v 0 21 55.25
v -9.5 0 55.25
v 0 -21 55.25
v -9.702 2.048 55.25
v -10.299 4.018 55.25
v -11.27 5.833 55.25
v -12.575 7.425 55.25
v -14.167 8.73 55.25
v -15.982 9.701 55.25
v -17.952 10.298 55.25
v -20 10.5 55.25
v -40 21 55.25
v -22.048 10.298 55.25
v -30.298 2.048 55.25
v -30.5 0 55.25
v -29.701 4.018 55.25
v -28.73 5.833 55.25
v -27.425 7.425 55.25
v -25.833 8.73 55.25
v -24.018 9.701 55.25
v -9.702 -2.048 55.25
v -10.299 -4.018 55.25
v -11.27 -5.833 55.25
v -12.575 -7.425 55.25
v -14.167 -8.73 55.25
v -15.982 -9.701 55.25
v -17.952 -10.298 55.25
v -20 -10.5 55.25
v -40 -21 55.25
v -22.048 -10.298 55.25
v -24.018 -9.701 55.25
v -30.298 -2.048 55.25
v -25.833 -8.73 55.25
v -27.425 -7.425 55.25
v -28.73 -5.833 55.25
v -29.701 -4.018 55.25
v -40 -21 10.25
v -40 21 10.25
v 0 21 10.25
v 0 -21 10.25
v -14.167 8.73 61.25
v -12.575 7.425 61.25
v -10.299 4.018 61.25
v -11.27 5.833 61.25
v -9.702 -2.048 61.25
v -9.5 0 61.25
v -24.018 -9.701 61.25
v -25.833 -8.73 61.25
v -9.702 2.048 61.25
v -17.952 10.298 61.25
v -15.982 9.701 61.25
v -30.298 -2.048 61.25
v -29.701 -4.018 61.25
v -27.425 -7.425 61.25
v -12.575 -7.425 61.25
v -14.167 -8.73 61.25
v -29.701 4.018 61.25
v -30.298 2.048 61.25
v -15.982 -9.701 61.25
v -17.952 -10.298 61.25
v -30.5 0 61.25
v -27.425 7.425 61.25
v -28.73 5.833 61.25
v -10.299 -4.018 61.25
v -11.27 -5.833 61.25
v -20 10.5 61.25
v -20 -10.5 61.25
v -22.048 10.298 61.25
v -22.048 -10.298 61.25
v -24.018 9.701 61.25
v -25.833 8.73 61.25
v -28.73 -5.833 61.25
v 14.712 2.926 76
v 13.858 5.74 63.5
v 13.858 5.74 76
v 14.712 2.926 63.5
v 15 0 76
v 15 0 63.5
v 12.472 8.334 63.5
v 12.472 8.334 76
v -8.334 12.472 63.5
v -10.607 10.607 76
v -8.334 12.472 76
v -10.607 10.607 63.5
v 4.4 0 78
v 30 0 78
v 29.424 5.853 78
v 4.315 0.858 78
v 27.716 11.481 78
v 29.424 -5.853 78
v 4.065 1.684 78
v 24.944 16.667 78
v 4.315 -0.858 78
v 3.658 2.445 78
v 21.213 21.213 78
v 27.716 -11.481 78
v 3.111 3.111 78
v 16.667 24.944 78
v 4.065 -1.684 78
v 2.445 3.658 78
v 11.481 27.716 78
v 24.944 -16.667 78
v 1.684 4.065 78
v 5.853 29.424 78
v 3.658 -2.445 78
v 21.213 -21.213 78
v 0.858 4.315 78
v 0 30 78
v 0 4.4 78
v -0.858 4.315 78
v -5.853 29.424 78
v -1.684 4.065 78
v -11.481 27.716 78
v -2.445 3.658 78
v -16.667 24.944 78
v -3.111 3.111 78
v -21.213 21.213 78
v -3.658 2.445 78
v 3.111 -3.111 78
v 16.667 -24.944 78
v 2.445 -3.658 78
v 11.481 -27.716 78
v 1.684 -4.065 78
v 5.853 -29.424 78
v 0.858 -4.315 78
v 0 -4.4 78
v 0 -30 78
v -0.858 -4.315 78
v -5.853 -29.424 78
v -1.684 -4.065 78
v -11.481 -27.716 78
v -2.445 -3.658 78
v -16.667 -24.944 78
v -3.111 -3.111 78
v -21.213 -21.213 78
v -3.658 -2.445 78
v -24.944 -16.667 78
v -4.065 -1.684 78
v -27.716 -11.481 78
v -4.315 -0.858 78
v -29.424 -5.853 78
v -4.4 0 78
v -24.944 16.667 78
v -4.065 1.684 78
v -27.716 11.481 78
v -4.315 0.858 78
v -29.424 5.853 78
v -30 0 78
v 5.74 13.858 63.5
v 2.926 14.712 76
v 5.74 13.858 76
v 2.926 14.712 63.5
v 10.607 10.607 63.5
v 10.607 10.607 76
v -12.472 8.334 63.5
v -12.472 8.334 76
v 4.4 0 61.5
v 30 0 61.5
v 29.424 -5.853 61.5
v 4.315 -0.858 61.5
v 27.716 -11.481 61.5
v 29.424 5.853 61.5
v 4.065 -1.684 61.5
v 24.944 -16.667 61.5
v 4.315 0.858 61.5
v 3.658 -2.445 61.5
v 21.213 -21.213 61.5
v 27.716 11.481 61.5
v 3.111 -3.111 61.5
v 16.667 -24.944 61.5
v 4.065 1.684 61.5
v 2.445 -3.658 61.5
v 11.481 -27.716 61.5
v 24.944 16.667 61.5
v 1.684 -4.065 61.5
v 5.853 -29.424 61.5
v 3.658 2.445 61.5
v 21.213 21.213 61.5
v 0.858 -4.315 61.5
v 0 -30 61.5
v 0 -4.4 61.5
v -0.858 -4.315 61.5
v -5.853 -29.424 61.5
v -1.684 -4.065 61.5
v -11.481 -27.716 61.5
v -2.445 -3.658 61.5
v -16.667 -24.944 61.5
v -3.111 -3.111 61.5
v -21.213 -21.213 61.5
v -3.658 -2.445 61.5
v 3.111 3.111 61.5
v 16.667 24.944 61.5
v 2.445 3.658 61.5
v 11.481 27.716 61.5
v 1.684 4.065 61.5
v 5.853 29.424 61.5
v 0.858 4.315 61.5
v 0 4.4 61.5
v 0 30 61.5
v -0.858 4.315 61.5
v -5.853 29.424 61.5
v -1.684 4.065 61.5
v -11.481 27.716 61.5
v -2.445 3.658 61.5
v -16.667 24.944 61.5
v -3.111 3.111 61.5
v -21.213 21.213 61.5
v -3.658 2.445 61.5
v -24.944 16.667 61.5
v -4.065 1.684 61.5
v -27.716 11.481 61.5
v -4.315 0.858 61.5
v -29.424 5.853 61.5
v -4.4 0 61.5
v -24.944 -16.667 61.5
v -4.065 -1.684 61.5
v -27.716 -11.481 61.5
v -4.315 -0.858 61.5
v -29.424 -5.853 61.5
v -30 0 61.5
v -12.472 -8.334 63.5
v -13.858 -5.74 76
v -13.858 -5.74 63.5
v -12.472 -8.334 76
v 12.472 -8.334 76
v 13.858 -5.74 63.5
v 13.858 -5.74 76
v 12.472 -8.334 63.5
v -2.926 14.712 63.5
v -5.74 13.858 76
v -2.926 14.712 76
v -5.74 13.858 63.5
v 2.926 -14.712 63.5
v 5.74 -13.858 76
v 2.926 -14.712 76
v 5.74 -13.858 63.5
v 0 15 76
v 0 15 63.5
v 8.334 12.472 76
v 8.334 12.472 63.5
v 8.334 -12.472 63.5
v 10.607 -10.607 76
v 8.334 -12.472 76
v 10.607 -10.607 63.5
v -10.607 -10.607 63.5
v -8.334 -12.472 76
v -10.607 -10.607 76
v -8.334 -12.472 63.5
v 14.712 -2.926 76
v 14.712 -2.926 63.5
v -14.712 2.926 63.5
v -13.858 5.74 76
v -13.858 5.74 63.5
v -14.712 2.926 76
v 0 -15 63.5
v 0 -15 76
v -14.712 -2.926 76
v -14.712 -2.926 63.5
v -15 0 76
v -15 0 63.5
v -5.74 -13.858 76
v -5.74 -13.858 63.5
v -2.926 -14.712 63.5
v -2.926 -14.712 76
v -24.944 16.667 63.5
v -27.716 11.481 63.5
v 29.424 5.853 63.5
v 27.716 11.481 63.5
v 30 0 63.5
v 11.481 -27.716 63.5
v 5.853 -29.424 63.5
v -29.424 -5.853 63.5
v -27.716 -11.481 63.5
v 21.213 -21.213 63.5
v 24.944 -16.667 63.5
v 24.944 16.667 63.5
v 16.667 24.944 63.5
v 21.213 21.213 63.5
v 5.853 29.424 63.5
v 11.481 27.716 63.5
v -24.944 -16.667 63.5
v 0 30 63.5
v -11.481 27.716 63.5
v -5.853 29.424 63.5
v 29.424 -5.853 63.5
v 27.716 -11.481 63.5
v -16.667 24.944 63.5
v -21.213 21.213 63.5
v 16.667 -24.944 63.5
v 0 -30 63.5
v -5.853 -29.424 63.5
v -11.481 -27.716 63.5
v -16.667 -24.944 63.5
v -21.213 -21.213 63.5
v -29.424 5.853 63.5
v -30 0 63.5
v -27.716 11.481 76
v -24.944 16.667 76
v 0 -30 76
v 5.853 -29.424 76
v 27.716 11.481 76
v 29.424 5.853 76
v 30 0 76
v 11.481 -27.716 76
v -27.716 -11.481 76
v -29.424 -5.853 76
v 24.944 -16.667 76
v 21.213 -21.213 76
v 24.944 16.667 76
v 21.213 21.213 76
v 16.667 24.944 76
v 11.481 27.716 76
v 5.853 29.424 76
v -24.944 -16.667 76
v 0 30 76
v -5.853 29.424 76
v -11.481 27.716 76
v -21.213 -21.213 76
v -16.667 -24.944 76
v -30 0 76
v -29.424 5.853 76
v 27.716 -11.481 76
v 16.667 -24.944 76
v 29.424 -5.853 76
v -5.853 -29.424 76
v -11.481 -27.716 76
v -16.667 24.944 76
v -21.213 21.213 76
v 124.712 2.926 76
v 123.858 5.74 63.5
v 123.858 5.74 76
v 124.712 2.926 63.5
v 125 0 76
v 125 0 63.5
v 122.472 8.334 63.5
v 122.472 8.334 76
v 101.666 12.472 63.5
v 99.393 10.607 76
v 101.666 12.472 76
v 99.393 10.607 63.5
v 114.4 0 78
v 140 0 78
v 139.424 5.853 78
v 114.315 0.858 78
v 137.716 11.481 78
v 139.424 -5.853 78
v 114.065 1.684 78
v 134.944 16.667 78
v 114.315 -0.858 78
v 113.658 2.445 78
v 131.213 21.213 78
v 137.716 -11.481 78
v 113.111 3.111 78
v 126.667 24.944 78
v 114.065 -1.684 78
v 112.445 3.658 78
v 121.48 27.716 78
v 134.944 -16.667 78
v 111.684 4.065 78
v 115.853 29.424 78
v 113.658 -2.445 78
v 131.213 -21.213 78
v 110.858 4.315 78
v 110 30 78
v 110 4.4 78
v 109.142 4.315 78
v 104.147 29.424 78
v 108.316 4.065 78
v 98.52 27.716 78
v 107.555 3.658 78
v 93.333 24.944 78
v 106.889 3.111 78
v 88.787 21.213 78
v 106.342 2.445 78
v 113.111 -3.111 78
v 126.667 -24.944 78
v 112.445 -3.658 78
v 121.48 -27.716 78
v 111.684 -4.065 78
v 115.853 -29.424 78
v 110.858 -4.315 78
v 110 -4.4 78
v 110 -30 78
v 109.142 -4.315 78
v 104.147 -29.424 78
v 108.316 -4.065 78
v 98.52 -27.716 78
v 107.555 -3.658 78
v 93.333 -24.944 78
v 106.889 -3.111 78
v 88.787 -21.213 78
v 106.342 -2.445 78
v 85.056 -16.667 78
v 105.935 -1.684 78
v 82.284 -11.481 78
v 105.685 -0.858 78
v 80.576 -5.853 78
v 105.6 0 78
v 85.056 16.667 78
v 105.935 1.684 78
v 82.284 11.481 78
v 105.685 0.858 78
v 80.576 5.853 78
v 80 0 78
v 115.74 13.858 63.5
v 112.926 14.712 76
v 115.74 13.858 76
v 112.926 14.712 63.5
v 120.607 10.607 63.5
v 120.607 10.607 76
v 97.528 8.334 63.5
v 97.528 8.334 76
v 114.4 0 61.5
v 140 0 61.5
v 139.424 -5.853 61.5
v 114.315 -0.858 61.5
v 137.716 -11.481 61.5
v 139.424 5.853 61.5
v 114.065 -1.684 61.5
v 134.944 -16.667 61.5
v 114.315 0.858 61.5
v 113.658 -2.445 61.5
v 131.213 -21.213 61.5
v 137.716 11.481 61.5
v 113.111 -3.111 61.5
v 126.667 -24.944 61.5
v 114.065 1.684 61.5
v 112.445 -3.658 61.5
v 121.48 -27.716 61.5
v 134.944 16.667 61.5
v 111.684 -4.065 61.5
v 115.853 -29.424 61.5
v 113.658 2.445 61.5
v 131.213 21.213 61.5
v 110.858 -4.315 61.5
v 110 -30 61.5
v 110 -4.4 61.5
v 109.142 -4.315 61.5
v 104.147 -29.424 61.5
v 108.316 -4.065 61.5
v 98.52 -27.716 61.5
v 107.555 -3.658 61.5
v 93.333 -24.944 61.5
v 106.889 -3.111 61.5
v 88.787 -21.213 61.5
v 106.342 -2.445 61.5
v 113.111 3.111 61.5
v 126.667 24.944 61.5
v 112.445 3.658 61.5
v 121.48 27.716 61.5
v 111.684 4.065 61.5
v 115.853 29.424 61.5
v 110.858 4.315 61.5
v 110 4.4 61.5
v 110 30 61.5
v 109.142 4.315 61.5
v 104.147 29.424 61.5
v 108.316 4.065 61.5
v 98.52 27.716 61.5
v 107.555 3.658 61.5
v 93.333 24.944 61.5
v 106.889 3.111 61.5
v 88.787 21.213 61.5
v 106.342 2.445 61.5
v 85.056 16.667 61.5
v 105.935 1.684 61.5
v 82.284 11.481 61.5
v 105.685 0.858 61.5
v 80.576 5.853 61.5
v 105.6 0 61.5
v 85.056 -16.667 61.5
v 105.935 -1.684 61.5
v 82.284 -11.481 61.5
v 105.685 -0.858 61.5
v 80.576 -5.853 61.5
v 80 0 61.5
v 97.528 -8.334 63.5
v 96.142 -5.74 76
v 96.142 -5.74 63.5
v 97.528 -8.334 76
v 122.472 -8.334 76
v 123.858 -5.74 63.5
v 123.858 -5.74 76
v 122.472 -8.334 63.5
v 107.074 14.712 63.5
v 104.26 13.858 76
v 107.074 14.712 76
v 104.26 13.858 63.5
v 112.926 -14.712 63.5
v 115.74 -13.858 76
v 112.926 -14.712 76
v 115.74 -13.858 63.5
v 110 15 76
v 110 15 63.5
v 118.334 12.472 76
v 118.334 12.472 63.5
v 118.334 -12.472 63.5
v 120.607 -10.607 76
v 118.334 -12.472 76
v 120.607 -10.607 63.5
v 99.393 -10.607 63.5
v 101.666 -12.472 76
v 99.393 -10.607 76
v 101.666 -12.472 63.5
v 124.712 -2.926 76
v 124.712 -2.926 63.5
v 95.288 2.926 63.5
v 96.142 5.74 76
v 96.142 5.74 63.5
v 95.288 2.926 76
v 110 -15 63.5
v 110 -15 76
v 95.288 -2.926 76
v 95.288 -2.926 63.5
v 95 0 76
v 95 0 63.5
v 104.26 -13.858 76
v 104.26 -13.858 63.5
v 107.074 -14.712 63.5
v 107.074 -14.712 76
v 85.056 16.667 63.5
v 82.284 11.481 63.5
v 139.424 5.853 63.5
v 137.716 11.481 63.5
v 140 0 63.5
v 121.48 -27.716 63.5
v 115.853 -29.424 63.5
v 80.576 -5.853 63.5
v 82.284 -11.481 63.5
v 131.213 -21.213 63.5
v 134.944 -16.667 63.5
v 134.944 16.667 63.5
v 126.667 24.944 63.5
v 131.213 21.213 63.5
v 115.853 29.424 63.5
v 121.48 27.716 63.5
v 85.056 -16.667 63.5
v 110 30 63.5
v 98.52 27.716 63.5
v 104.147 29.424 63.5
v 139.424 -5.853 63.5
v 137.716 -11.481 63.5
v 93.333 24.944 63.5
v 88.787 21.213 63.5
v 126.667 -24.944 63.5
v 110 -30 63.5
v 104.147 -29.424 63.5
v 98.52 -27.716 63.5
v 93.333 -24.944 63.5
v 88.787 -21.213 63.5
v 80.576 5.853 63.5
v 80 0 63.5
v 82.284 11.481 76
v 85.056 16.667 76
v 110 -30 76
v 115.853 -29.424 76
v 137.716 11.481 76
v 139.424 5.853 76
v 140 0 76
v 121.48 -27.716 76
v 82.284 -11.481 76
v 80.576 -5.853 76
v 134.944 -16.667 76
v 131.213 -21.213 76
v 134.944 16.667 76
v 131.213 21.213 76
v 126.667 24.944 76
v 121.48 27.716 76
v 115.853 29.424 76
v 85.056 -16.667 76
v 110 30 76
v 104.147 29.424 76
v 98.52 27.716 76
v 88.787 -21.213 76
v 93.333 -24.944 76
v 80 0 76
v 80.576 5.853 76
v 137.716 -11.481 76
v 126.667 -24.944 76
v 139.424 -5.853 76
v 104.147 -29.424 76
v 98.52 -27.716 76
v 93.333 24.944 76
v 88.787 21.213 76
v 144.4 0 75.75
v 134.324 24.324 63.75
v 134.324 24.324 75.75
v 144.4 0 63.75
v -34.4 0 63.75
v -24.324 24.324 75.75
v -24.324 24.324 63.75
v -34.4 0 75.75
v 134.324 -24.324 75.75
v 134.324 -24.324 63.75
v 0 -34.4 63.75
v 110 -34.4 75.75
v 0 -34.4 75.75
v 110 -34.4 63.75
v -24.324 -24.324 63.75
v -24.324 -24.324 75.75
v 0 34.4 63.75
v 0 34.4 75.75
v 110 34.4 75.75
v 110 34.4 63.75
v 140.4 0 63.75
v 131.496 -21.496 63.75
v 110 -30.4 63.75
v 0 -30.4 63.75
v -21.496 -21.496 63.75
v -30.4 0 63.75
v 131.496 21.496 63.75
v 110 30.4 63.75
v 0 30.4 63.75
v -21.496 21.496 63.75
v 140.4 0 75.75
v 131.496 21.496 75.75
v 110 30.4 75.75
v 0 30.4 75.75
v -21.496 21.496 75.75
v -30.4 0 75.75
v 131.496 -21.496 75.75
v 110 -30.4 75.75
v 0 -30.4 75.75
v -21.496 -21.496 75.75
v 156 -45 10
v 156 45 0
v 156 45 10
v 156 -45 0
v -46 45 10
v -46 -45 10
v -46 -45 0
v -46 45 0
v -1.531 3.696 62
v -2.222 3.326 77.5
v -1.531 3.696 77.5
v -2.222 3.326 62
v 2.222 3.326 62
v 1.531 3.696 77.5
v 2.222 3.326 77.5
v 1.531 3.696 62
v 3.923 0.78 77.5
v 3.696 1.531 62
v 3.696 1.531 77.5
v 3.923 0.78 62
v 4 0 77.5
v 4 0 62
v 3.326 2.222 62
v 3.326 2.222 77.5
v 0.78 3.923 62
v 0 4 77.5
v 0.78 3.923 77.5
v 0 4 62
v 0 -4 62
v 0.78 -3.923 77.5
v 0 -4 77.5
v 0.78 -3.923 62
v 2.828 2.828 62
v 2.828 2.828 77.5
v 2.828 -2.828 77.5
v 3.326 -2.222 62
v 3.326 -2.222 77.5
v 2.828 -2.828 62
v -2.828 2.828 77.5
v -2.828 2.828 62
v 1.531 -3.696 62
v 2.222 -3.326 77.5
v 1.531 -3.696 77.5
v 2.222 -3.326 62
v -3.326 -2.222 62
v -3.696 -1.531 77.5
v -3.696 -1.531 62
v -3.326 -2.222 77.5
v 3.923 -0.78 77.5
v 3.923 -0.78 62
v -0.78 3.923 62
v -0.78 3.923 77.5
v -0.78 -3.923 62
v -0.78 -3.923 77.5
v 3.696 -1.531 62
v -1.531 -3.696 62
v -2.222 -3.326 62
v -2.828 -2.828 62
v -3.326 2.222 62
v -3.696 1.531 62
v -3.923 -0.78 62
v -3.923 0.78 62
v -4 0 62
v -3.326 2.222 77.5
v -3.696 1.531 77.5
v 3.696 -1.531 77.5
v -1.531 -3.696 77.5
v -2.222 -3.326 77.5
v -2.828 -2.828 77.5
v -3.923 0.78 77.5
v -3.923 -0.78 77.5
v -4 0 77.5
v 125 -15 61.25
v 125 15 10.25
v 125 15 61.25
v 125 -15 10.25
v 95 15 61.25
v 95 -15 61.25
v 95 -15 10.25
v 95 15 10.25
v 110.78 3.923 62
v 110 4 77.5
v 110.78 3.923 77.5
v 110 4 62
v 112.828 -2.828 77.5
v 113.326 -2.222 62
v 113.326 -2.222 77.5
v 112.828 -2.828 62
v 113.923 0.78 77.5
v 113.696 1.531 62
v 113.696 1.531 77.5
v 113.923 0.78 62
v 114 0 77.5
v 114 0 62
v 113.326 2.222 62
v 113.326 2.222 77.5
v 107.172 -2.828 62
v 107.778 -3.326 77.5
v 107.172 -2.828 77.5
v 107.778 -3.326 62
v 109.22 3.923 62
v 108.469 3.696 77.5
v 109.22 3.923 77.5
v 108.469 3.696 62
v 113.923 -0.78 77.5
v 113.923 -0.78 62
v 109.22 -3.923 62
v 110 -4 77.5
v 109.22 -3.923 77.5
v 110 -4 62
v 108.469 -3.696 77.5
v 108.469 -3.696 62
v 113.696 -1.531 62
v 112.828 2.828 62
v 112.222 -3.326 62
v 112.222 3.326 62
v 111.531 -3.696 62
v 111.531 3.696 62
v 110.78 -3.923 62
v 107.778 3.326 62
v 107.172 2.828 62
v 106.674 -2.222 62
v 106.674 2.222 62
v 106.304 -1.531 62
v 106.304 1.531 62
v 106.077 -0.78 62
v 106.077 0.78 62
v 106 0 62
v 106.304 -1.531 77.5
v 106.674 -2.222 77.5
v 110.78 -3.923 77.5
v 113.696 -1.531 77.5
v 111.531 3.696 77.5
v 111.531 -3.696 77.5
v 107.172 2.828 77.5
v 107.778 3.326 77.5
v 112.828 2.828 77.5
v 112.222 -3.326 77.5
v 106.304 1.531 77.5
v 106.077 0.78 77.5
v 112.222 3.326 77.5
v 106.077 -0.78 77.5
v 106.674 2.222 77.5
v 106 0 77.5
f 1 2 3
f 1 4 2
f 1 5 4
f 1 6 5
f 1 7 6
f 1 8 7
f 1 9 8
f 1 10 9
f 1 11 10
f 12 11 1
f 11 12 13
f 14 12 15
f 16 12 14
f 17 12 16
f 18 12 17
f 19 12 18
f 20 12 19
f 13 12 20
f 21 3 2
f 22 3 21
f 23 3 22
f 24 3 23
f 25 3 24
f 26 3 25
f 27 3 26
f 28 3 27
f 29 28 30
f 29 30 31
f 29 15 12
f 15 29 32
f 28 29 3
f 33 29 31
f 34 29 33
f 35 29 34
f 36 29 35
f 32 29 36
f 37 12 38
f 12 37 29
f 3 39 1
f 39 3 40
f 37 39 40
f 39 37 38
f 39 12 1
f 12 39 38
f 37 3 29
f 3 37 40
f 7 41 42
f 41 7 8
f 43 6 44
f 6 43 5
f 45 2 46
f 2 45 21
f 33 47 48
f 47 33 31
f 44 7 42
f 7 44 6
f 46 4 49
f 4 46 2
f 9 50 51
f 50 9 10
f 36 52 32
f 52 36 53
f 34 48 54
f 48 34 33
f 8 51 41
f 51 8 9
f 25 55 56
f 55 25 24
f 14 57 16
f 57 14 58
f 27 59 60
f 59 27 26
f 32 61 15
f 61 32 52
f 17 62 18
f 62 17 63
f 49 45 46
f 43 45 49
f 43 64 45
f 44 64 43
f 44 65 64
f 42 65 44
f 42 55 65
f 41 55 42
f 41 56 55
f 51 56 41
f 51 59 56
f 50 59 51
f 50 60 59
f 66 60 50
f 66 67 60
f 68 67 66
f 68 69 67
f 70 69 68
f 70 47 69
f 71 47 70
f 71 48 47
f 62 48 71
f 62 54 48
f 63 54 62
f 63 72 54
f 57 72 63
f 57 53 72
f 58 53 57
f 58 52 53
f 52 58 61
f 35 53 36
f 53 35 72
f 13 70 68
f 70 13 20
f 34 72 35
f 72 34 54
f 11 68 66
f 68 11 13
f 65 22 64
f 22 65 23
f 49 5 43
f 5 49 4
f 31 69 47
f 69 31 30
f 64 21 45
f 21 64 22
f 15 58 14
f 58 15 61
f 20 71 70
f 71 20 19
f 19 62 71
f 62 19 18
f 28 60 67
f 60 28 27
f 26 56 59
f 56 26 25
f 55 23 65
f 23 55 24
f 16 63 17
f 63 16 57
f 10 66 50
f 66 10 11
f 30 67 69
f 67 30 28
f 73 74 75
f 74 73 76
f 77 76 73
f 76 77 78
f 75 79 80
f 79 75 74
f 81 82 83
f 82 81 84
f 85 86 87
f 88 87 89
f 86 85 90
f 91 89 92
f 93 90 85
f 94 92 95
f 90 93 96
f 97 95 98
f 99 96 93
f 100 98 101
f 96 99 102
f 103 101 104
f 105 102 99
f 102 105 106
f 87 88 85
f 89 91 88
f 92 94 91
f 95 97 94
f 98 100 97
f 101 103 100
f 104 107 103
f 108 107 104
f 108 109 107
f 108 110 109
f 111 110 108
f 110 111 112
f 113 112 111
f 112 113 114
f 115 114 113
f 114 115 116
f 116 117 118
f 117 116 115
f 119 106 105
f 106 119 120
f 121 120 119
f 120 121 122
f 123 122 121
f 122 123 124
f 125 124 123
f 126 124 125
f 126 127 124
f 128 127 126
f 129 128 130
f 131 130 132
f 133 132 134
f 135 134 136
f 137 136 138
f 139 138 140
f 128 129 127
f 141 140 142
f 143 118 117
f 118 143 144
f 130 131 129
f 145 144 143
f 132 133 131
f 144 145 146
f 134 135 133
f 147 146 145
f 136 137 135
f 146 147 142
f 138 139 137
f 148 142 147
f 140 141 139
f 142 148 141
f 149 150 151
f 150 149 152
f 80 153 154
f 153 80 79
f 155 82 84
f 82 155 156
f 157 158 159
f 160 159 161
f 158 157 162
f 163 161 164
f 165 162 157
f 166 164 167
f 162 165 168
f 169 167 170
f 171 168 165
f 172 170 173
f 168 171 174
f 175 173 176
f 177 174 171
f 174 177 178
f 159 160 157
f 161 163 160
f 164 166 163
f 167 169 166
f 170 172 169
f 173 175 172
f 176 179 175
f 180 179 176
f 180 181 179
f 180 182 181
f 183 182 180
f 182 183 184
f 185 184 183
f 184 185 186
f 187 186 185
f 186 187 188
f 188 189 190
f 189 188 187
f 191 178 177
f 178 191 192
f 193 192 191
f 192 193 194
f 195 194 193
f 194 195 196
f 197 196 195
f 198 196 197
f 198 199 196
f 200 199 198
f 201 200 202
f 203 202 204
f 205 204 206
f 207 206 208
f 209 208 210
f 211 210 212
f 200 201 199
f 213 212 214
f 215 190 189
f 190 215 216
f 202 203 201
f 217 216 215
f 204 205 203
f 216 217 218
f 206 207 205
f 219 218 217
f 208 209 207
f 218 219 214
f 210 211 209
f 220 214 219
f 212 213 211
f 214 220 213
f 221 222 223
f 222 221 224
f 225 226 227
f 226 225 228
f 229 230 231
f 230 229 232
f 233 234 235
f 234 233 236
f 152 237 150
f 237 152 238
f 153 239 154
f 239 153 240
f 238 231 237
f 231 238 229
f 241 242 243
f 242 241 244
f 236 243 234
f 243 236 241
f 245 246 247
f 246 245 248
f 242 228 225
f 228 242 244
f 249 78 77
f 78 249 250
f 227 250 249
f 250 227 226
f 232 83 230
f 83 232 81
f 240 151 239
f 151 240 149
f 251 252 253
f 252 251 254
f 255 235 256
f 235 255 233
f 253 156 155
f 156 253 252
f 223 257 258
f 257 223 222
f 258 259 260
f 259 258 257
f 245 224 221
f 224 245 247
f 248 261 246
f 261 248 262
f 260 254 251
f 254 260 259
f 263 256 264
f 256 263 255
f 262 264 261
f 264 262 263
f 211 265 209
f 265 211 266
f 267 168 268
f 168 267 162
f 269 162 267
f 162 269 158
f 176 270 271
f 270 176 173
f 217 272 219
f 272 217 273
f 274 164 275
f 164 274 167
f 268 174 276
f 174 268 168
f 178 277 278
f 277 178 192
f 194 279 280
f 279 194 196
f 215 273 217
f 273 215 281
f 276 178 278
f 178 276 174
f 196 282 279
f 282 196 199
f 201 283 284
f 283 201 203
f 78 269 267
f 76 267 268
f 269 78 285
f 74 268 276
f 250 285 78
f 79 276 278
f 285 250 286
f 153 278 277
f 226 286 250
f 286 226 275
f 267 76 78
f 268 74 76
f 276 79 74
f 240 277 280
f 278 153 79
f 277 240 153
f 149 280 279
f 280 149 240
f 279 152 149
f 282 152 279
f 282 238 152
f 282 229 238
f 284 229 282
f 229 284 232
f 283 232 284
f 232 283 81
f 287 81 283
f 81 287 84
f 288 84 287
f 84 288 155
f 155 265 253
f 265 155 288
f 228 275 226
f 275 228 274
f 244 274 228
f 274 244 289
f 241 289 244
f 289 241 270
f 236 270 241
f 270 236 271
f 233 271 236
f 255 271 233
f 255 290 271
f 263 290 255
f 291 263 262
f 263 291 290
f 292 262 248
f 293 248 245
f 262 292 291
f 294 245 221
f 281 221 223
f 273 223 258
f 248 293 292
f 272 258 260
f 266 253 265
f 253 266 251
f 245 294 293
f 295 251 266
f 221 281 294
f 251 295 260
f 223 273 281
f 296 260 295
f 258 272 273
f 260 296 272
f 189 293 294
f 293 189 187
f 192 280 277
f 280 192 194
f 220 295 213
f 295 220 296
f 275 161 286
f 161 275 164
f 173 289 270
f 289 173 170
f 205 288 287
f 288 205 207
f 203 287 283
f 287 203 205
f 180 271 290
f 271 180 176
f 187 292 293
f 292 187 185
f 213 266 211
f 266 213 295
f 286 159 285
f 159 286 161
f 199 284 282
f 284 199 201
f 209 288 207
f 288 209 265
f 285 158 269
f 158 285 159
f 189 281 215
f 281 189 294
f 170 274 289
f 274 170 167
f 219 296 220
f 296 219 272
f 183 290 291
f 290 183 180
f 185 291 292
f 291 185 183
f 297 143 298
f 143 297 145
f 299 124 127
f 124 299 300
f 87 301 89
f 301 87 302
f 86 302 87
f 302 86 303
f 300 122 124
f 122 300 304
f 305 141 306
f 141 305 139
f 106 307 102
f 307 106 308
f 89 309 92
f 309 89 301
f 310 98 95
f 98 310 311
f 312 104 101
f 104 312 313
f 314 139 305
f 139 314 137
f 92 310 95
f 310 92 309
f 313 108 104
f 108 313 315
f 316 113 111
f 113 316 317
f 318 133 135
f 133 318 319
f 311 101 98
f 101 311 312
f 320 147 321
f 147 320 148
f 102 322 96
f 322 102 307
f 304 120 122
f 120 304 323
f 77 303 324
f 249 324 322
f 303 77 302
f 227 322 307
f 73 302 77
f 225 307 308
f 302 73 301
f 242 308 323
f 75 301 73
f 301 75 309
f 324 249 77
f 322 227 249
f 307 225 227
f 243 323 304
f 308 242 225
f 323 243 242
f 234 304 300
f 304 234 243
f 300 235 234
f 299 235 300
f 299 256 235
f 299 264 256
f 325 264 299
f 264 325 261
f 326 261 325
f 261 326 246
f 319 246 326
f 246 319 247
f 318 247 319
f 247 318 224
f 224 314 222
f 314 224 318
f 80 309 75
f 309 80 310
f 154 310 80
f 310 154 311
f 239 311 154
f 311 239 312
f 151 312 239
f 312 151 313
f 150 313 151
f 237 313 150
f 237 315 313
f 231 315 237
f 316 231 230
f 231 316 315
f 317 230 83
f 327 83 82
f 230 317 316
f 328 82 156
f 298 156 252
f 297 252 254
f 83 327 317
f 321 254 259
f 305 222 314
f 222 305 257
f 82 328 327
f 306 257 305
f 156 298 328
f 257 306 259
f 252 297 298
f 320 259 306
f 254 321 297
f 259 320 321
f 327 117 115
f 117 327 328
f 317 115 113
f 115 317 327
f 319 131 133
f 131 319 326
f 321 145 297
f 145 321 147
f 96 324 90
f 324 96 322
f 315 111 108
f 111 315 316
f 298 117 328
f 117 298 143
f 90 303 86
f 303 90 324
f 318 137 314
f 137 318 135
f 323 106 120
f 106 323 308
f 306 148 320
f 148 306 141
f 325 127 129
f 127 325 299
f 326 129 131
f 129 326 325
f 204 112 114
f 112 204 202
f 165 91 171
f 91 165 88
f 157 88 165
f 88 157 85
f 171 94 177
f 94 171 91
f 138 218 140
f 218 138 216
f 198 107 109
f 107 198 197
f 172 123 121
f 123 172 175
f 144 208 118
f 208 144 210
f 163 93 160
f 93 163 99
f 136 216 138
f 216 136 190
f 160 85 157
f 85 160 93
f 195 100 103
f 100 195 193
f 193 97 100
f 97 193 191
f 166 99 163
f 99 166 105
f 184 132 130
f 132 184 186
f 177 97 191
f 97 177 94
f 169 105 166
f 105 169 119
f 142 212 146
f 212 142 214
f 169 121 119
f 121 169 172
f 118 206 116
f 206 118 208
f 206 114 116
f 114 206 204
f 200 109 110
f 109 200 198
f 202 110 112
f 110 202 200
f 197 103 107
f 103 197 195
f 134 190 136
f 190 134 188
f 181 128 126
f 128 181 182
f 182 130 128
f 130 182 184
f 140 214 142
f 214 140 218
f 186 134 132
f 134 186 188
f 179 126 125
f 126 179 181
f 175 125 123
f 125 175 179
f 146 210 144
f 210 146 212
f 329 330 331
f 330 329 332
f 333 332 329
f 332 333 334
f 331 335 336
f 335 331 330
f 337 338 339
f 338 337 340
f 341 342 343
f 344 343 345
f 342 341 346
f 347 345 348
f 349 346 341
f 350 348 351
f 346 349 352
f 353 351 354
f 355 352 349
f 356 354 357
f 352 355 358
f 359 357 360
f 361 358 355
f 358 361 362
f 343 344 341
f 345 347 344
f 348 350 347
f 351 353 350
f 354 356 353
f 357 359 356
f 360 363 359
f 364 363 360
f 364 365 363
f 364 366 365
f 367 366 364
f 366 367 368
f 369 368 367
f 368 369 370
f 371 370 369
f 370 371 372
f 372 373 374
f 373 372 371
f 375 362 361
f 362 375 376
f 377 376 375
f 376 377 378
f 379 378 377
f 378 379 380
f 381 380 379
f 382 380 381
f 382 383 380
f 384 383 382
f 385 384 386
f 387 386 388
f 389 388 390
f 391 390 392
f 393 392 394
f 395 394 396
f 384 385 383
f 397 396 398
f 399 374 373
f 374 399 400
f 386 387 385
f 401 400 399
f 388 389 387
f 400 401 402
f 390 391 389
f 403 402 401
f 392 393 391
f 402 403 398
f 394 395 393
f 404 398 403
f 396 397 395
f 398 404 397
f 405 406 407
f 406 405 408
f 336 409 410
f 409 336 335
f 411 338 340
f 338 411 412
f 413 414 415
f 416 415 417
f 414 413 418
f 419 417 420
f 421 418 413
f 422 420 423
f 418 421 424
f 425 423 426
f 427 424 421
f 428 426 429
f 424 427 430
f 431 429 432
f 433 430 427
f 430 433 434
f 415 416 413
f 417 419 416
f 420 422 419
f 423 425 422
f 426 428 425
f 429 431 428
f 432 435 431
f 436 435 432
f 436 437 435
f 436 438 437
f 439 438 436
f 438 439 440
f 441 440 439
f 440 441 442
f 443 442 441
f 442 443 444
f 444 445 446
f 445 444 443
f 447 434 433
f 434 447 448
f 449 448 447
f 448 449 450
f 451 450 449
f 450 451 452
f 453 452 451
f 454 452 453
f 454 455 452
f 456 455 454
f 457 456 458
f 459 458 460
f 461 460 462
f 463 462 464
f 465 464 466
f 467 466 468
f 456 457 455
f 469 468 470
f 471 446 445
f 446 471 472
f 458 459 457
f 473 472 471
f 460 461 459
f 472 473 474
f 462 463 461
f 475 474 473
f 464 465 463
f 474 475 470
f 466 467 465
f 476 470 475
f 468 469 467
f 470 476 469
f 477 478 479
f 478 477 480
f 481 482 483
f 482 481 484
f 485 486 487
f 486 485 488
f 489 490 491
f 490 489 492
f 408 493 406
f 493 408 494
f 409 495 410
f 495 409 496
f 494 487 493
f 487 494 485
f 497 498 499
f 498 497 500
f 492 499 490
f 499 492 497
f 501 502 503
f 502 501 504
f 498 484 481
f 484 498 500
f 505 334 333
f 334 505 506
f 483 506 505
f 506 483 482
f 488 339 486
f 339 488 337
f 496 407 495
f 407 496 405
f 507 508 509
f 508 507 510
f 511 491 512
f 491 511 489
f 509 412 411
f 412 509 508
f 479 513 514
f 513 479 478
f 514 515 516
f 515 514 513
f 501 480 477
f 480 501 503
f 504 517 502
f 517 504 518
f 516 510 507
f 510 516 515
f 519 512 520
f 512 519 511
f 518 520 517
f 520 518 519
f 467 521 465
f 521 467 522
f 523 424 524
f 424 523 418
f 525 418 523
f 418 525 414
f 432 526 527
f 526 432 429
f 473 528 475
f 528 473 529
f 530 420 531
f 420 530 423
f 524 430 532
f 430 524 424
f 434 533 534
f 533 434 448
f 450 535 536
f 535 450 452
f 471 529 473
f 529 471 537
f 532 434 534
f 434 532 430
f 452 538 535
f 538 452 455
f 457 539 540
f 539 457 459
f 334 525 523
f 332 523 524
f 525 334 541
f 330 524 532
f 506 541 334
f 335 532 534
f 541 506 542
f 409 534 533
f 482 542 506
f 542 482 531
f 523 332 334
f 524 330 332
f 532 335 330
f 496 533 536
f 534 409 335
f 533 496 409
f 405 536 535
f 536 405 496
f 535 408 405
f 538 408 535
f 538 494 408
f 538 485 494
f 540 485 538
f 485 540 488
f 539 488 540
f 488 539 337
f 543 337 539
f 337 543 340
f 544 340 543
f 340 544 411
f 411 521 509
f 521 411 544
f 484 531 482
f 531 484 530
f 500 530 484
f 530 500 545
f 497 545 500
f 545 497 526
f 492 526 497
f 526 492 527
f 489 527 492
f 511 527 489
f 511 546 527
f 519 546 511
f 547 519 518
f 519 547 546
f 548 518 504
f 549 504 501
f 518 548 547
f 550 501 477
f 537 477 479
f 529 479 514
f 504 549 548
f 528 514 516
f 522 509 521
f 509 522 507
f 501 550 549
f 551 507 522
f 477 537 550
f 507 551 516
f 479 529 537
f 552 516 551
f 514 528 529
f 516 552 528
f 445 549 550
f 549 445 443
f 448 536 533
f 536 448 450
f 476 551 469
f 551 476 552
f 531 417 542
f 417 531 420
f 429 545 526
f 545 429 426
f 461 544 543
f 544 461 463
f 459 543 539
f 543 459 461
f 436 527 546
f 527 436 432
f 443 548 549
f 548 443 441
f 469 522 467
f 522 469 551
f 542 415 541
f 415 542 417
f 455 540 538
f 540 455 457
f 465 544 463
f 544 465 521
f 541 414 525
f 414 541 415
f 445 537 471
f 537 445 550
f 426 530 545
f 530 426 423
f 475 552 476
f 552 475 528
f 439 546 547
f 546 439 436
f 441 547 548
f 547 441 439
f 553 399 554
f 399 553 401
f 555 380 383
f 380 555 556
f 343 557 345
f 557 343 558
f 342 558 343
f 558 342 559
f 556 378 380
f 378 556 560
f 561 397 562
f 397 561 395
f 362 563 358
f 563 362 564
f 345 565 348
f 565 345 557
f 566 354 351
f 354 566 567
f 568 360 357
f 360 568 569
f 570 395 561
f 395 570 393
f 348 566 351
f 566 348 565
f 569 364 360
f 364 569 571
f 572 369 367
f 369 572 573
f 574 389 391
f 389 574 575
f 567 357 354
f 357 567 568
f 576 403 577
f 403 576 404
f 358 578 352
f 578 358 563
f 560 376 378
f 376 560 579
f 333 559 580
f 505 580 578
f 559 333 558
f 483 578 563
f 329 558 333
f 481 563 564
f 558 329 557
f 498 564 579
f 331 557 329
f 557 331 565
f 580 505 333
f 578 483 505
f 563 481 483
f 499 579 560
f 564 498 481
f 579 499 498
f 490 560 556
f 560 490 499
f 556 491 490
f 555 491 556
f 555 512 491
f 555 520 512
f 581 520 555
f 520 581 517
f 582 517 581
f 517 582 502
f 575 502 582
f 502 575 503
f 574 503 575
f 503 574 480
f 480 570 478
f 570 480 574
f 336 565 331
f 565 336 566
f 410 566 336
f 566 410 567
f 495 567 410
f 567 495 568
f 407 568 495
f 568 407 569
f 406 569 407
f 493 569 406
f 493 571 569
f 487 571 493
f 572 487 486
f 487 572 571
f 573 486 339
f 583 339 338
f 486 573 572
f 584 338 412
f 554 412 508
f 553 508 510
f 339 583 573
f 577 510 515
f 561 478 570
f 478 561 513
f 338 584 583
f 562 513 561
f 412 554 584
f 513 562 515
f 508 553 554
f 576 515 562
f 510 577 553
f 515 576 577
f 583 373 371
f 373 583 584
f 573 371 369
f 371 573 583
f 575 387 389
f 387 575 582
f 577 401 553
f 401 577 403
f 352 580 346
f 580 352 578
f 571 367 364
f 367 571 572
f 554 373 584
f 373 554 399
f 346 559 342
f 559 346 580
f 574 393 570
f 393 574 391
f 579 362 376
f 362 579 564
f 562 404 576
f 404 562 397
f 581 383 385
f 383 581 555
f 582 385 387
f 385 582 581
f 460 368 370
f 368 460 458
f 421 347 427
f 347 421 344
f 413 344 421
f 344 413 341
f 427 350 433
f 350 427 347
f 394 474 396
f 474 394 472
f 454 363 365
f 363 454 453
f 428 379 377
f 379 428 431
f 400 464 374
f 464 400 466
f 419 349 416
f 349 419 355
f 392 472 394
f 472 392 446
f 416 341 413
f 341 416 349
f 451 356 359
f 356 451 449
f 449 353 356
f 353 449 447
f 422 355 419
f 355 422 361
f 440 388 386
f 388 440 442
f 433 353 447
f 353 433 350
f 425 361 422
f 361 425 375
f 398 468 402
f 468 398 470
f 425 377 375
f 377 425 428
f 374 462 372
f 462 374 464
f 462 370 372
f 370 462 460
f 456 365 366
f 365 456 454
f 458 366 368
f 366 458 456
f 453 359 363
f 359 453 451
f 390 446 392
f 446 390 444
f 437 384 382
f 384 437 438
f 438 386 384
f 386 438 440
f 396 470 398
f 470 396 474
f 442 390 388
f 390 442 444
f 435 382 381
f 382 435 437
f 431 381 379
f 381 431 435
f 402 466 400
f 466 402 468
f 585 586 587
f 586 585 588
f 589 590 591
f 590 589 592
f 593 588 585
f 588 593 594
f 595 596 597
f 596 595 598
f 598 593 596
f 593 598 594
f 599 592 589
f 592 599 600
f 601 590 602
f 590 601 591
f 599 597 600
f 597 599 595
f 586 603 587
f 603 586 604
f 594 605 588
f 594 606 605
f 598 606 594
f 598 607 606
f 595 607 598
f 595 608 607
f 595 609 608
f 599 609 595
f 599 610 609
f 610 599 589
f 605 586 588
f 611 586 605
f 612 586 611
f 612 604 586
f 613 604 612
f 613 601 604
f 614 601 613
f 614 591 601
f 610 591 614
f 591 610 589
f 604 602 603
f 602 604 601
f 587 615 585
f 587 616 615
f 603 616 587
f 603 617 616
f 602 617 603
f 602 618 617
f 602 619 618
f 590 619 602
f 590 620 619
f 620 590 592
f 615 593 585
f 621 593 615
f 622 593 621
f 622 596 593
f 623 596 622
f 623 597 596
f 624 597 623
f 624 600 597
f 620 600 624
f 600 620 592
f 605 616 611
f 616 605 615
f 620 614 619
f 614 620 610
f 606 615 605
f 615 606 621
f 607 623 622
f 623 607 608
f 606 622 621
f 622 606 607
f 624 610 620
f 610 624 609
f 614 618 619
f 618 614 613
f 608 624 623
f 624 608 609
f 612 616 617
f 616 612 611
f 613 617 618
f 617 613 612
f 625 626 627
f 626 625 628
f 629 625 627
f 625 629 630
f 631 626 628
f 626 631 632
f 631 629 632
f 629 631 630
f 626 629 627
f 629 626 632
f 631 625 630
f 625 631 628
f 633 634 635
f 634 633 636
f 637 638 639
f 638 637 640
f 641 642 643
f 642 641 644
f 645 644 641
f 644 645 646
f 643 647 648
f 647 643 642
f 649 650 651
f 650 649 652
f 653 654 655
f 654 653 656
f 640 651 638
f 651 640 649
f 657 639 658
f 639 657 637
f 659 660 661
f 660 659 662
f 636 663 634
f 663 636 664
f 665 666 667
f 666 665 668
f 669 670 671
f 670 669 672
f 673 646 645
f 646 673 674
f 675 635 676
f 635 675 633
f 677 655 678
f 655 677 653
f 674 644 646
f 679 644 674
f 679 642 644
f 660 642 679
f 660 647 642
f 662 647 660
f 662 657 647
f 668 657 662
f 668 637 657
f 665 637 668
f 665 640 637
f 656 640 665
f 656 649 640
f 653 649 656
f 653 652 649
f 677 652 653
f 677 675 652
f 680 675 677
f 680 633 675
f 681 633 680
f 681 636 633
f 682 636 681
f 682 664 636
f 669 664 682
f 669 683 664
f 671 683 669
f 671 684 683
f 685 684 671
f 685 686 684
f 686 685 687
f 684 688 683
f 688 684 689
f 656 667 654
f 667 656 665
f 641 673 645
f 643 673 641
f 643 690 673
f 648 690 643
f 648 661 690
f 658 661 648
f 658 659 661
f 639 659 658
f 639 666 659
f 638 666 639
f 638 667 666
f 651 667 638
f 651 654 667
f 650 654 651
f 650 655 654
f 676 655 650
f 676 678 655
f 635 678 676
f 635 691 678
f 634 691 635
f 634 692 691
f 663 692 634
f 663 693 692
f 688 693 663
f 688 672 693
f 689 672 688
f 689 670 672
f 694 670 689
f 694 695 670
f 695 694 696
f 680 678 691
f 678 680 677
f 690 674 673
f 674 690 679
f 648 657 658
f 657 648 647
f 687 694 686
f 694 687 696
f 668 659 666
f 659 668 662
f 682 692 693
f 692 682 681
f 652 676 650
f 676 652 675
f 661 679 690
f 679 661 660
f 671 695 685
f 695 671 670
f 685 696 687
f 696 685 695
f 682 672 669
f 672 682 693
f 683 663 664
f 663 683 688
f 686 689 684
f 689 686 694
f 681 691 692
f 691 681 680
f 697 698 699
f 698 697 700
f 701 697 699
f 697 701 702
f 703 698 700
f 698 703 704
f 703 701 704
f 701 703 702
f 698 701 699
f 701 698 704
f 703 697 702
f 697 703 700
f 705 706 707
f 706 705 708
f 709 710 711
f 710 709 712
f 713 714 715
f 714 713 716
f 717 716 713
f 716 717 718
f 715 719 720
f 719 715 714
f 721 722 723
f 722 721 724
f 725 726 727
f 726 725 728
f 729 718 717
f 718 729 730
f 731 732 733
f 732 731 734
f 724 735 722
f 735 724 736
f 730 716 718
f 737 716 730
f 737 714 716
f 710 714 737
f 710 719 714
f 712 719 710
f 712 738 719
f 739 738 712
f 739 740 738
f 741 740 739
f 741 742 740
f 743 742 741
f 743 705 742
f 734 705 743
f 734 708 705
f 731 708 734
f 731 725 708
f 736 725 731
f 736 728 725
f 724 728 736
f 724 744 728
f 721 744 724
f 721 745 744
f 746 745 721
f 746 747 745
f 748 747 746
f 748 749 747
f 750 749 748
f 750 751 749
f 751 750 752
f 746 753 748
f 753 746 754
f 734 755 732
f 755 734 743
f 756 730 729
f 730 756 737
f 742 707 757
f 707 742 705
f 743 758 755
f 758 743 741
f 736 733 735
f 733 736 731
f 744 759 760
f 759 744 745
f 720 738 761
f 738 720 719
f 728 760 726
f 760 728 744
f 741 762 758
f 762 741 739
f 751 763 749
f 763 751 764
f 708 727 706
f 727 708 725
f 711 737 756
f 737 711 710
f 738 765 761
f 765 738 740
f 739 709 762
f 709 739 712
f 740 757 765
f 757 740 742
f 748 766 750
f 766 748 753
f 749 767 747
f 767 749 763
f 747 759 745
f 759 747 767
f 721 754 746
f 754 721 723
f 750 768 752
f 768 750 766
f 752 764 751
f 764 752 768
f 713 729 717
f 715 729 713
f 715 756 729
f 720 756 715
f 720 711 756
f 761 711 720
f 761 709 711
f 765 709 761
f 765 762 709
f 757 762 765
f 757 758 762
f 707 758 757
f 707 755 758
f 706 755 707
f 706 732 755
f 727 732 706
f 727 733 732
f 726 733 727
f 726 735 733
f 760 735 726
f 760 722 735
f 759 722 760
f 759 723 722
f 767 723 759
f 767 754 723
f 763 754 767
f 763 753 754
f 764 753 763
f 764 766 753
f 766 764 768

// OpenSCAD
$fn = 32;

// ------------------------------------------------------------------------
// Motor belt drive: span 110 mm, pulleys d60, belt 12 mm wide
// Every part is its own module, assembly() places every instance.
// ------------------------------------------------------------------------

// --- part 1 ---
module base_plate() {
  difference() {
    translate([-101, -45, 0]) cube([202, 90, 10]);
  }
}

// --- part 2 ---
module motor() {
  union() {
    translate([-22.5, -21, 0]) cube([45, 42, 40]);
    translate([25.5, 0, 20]) rotate([0, 90, 0]) cylinder(h = 6, d = 21, center = true);
  }
}

// --- part 3 ---
module drive_shaft() {
  translate([0, 0, -7.75]) cylinder(h = 15.5, d = 8);
}

// --- part 4 ---
module pulley_drive() {
  difference() {
    union() {
      cylinder(h = 16.5, d = 30);
      cylinder(h = 2, d = 60);
      translate([0, 0, 14.5]) cylinder(h = 2, d = 60);
    }
    translate([0, 0, -1]) cylinder(h = 18.5, d = 8.8);
  }
}

// --- part 5 ---
module idler_post() {
  translate([-15, -15, 0]) cube([30, 30, 51]);
}

// --- part 6 ---
module driven_shaft() {
  translate([0, 0, -7.75]) cylinder(h = 15.5, d = 8);
}

// --- part 7 ---
module pulley_driven() {
  difference() {
    union() {
      cylinder(h = 16.5, d = 30);
      cylinder(h = 2, d = 60);
      translate([0, 0, 14.5]) cylinder(h = 2, d = 60);
    }
    translate([0, 0, -1]) cylinder(h = 18.5, d = 8.8);
  }
}

// --- part 8 ---
module drive_belt() {
  difference() {
    linear_extrude(height = 12) polygon(points = concat([for (a = [90 : 45 : 270]) [34.4 * cos(a), 34.4 * sin(a)]], [for (a = [270 : 45 : 450]) [110 + 34.4 * cos(a), 34.4 * sin(a)]]));
    translate([0, 0, -1]) linear_extrude(height = 14) polygon(points = concat([for (a = [90 : 45 : 270]) [30.4 * cos(a), 30.4 * sin(a)]], [for (a = [270 : 45 : 450]) [110 + 30.4 * cos(a), 30.4 * sin(a)]]));
  }
}

// --- assembly ---
module assembly() {
  color([0.80, 0.24, 0.20]) translate([55, 0, 0]) rotate([0, 0, 0]) base_plate();
  color([0.20, 0.45, 0.75]) translate([0, 0, 32.75]) rotate([0, 270, 0]) motor();
  color([0.25, 0.62, 0.32]) translate([0, 0, 69.75]) rotate([0, 0, 0]) drive_shaft();
  color([0.92, 0.70, 0.18]) translate([0, 0, 61.5]) rotate([0, 0, 0]) pulley_drive();
  color([0.58, 0.35, 0.70]) translate([110, 0, 10.25]) rotate([0, 0, 0]) idler_post();
  color([0.16, 0.66, 0.66]) translate([110, 0, 69.75]) rotate([0, 0, 0]) driven_shaft();
  color([0.85, 0.48, 0.18]) translate([110, 0, 61.5]) rotate([0, 0, 0]) pulley_driven();
  color([0.55, 0.60, 0.65]) translate([0, 0, 63.75]) rotate([0, 0, 0]) drive_belt();
}

assembly();
